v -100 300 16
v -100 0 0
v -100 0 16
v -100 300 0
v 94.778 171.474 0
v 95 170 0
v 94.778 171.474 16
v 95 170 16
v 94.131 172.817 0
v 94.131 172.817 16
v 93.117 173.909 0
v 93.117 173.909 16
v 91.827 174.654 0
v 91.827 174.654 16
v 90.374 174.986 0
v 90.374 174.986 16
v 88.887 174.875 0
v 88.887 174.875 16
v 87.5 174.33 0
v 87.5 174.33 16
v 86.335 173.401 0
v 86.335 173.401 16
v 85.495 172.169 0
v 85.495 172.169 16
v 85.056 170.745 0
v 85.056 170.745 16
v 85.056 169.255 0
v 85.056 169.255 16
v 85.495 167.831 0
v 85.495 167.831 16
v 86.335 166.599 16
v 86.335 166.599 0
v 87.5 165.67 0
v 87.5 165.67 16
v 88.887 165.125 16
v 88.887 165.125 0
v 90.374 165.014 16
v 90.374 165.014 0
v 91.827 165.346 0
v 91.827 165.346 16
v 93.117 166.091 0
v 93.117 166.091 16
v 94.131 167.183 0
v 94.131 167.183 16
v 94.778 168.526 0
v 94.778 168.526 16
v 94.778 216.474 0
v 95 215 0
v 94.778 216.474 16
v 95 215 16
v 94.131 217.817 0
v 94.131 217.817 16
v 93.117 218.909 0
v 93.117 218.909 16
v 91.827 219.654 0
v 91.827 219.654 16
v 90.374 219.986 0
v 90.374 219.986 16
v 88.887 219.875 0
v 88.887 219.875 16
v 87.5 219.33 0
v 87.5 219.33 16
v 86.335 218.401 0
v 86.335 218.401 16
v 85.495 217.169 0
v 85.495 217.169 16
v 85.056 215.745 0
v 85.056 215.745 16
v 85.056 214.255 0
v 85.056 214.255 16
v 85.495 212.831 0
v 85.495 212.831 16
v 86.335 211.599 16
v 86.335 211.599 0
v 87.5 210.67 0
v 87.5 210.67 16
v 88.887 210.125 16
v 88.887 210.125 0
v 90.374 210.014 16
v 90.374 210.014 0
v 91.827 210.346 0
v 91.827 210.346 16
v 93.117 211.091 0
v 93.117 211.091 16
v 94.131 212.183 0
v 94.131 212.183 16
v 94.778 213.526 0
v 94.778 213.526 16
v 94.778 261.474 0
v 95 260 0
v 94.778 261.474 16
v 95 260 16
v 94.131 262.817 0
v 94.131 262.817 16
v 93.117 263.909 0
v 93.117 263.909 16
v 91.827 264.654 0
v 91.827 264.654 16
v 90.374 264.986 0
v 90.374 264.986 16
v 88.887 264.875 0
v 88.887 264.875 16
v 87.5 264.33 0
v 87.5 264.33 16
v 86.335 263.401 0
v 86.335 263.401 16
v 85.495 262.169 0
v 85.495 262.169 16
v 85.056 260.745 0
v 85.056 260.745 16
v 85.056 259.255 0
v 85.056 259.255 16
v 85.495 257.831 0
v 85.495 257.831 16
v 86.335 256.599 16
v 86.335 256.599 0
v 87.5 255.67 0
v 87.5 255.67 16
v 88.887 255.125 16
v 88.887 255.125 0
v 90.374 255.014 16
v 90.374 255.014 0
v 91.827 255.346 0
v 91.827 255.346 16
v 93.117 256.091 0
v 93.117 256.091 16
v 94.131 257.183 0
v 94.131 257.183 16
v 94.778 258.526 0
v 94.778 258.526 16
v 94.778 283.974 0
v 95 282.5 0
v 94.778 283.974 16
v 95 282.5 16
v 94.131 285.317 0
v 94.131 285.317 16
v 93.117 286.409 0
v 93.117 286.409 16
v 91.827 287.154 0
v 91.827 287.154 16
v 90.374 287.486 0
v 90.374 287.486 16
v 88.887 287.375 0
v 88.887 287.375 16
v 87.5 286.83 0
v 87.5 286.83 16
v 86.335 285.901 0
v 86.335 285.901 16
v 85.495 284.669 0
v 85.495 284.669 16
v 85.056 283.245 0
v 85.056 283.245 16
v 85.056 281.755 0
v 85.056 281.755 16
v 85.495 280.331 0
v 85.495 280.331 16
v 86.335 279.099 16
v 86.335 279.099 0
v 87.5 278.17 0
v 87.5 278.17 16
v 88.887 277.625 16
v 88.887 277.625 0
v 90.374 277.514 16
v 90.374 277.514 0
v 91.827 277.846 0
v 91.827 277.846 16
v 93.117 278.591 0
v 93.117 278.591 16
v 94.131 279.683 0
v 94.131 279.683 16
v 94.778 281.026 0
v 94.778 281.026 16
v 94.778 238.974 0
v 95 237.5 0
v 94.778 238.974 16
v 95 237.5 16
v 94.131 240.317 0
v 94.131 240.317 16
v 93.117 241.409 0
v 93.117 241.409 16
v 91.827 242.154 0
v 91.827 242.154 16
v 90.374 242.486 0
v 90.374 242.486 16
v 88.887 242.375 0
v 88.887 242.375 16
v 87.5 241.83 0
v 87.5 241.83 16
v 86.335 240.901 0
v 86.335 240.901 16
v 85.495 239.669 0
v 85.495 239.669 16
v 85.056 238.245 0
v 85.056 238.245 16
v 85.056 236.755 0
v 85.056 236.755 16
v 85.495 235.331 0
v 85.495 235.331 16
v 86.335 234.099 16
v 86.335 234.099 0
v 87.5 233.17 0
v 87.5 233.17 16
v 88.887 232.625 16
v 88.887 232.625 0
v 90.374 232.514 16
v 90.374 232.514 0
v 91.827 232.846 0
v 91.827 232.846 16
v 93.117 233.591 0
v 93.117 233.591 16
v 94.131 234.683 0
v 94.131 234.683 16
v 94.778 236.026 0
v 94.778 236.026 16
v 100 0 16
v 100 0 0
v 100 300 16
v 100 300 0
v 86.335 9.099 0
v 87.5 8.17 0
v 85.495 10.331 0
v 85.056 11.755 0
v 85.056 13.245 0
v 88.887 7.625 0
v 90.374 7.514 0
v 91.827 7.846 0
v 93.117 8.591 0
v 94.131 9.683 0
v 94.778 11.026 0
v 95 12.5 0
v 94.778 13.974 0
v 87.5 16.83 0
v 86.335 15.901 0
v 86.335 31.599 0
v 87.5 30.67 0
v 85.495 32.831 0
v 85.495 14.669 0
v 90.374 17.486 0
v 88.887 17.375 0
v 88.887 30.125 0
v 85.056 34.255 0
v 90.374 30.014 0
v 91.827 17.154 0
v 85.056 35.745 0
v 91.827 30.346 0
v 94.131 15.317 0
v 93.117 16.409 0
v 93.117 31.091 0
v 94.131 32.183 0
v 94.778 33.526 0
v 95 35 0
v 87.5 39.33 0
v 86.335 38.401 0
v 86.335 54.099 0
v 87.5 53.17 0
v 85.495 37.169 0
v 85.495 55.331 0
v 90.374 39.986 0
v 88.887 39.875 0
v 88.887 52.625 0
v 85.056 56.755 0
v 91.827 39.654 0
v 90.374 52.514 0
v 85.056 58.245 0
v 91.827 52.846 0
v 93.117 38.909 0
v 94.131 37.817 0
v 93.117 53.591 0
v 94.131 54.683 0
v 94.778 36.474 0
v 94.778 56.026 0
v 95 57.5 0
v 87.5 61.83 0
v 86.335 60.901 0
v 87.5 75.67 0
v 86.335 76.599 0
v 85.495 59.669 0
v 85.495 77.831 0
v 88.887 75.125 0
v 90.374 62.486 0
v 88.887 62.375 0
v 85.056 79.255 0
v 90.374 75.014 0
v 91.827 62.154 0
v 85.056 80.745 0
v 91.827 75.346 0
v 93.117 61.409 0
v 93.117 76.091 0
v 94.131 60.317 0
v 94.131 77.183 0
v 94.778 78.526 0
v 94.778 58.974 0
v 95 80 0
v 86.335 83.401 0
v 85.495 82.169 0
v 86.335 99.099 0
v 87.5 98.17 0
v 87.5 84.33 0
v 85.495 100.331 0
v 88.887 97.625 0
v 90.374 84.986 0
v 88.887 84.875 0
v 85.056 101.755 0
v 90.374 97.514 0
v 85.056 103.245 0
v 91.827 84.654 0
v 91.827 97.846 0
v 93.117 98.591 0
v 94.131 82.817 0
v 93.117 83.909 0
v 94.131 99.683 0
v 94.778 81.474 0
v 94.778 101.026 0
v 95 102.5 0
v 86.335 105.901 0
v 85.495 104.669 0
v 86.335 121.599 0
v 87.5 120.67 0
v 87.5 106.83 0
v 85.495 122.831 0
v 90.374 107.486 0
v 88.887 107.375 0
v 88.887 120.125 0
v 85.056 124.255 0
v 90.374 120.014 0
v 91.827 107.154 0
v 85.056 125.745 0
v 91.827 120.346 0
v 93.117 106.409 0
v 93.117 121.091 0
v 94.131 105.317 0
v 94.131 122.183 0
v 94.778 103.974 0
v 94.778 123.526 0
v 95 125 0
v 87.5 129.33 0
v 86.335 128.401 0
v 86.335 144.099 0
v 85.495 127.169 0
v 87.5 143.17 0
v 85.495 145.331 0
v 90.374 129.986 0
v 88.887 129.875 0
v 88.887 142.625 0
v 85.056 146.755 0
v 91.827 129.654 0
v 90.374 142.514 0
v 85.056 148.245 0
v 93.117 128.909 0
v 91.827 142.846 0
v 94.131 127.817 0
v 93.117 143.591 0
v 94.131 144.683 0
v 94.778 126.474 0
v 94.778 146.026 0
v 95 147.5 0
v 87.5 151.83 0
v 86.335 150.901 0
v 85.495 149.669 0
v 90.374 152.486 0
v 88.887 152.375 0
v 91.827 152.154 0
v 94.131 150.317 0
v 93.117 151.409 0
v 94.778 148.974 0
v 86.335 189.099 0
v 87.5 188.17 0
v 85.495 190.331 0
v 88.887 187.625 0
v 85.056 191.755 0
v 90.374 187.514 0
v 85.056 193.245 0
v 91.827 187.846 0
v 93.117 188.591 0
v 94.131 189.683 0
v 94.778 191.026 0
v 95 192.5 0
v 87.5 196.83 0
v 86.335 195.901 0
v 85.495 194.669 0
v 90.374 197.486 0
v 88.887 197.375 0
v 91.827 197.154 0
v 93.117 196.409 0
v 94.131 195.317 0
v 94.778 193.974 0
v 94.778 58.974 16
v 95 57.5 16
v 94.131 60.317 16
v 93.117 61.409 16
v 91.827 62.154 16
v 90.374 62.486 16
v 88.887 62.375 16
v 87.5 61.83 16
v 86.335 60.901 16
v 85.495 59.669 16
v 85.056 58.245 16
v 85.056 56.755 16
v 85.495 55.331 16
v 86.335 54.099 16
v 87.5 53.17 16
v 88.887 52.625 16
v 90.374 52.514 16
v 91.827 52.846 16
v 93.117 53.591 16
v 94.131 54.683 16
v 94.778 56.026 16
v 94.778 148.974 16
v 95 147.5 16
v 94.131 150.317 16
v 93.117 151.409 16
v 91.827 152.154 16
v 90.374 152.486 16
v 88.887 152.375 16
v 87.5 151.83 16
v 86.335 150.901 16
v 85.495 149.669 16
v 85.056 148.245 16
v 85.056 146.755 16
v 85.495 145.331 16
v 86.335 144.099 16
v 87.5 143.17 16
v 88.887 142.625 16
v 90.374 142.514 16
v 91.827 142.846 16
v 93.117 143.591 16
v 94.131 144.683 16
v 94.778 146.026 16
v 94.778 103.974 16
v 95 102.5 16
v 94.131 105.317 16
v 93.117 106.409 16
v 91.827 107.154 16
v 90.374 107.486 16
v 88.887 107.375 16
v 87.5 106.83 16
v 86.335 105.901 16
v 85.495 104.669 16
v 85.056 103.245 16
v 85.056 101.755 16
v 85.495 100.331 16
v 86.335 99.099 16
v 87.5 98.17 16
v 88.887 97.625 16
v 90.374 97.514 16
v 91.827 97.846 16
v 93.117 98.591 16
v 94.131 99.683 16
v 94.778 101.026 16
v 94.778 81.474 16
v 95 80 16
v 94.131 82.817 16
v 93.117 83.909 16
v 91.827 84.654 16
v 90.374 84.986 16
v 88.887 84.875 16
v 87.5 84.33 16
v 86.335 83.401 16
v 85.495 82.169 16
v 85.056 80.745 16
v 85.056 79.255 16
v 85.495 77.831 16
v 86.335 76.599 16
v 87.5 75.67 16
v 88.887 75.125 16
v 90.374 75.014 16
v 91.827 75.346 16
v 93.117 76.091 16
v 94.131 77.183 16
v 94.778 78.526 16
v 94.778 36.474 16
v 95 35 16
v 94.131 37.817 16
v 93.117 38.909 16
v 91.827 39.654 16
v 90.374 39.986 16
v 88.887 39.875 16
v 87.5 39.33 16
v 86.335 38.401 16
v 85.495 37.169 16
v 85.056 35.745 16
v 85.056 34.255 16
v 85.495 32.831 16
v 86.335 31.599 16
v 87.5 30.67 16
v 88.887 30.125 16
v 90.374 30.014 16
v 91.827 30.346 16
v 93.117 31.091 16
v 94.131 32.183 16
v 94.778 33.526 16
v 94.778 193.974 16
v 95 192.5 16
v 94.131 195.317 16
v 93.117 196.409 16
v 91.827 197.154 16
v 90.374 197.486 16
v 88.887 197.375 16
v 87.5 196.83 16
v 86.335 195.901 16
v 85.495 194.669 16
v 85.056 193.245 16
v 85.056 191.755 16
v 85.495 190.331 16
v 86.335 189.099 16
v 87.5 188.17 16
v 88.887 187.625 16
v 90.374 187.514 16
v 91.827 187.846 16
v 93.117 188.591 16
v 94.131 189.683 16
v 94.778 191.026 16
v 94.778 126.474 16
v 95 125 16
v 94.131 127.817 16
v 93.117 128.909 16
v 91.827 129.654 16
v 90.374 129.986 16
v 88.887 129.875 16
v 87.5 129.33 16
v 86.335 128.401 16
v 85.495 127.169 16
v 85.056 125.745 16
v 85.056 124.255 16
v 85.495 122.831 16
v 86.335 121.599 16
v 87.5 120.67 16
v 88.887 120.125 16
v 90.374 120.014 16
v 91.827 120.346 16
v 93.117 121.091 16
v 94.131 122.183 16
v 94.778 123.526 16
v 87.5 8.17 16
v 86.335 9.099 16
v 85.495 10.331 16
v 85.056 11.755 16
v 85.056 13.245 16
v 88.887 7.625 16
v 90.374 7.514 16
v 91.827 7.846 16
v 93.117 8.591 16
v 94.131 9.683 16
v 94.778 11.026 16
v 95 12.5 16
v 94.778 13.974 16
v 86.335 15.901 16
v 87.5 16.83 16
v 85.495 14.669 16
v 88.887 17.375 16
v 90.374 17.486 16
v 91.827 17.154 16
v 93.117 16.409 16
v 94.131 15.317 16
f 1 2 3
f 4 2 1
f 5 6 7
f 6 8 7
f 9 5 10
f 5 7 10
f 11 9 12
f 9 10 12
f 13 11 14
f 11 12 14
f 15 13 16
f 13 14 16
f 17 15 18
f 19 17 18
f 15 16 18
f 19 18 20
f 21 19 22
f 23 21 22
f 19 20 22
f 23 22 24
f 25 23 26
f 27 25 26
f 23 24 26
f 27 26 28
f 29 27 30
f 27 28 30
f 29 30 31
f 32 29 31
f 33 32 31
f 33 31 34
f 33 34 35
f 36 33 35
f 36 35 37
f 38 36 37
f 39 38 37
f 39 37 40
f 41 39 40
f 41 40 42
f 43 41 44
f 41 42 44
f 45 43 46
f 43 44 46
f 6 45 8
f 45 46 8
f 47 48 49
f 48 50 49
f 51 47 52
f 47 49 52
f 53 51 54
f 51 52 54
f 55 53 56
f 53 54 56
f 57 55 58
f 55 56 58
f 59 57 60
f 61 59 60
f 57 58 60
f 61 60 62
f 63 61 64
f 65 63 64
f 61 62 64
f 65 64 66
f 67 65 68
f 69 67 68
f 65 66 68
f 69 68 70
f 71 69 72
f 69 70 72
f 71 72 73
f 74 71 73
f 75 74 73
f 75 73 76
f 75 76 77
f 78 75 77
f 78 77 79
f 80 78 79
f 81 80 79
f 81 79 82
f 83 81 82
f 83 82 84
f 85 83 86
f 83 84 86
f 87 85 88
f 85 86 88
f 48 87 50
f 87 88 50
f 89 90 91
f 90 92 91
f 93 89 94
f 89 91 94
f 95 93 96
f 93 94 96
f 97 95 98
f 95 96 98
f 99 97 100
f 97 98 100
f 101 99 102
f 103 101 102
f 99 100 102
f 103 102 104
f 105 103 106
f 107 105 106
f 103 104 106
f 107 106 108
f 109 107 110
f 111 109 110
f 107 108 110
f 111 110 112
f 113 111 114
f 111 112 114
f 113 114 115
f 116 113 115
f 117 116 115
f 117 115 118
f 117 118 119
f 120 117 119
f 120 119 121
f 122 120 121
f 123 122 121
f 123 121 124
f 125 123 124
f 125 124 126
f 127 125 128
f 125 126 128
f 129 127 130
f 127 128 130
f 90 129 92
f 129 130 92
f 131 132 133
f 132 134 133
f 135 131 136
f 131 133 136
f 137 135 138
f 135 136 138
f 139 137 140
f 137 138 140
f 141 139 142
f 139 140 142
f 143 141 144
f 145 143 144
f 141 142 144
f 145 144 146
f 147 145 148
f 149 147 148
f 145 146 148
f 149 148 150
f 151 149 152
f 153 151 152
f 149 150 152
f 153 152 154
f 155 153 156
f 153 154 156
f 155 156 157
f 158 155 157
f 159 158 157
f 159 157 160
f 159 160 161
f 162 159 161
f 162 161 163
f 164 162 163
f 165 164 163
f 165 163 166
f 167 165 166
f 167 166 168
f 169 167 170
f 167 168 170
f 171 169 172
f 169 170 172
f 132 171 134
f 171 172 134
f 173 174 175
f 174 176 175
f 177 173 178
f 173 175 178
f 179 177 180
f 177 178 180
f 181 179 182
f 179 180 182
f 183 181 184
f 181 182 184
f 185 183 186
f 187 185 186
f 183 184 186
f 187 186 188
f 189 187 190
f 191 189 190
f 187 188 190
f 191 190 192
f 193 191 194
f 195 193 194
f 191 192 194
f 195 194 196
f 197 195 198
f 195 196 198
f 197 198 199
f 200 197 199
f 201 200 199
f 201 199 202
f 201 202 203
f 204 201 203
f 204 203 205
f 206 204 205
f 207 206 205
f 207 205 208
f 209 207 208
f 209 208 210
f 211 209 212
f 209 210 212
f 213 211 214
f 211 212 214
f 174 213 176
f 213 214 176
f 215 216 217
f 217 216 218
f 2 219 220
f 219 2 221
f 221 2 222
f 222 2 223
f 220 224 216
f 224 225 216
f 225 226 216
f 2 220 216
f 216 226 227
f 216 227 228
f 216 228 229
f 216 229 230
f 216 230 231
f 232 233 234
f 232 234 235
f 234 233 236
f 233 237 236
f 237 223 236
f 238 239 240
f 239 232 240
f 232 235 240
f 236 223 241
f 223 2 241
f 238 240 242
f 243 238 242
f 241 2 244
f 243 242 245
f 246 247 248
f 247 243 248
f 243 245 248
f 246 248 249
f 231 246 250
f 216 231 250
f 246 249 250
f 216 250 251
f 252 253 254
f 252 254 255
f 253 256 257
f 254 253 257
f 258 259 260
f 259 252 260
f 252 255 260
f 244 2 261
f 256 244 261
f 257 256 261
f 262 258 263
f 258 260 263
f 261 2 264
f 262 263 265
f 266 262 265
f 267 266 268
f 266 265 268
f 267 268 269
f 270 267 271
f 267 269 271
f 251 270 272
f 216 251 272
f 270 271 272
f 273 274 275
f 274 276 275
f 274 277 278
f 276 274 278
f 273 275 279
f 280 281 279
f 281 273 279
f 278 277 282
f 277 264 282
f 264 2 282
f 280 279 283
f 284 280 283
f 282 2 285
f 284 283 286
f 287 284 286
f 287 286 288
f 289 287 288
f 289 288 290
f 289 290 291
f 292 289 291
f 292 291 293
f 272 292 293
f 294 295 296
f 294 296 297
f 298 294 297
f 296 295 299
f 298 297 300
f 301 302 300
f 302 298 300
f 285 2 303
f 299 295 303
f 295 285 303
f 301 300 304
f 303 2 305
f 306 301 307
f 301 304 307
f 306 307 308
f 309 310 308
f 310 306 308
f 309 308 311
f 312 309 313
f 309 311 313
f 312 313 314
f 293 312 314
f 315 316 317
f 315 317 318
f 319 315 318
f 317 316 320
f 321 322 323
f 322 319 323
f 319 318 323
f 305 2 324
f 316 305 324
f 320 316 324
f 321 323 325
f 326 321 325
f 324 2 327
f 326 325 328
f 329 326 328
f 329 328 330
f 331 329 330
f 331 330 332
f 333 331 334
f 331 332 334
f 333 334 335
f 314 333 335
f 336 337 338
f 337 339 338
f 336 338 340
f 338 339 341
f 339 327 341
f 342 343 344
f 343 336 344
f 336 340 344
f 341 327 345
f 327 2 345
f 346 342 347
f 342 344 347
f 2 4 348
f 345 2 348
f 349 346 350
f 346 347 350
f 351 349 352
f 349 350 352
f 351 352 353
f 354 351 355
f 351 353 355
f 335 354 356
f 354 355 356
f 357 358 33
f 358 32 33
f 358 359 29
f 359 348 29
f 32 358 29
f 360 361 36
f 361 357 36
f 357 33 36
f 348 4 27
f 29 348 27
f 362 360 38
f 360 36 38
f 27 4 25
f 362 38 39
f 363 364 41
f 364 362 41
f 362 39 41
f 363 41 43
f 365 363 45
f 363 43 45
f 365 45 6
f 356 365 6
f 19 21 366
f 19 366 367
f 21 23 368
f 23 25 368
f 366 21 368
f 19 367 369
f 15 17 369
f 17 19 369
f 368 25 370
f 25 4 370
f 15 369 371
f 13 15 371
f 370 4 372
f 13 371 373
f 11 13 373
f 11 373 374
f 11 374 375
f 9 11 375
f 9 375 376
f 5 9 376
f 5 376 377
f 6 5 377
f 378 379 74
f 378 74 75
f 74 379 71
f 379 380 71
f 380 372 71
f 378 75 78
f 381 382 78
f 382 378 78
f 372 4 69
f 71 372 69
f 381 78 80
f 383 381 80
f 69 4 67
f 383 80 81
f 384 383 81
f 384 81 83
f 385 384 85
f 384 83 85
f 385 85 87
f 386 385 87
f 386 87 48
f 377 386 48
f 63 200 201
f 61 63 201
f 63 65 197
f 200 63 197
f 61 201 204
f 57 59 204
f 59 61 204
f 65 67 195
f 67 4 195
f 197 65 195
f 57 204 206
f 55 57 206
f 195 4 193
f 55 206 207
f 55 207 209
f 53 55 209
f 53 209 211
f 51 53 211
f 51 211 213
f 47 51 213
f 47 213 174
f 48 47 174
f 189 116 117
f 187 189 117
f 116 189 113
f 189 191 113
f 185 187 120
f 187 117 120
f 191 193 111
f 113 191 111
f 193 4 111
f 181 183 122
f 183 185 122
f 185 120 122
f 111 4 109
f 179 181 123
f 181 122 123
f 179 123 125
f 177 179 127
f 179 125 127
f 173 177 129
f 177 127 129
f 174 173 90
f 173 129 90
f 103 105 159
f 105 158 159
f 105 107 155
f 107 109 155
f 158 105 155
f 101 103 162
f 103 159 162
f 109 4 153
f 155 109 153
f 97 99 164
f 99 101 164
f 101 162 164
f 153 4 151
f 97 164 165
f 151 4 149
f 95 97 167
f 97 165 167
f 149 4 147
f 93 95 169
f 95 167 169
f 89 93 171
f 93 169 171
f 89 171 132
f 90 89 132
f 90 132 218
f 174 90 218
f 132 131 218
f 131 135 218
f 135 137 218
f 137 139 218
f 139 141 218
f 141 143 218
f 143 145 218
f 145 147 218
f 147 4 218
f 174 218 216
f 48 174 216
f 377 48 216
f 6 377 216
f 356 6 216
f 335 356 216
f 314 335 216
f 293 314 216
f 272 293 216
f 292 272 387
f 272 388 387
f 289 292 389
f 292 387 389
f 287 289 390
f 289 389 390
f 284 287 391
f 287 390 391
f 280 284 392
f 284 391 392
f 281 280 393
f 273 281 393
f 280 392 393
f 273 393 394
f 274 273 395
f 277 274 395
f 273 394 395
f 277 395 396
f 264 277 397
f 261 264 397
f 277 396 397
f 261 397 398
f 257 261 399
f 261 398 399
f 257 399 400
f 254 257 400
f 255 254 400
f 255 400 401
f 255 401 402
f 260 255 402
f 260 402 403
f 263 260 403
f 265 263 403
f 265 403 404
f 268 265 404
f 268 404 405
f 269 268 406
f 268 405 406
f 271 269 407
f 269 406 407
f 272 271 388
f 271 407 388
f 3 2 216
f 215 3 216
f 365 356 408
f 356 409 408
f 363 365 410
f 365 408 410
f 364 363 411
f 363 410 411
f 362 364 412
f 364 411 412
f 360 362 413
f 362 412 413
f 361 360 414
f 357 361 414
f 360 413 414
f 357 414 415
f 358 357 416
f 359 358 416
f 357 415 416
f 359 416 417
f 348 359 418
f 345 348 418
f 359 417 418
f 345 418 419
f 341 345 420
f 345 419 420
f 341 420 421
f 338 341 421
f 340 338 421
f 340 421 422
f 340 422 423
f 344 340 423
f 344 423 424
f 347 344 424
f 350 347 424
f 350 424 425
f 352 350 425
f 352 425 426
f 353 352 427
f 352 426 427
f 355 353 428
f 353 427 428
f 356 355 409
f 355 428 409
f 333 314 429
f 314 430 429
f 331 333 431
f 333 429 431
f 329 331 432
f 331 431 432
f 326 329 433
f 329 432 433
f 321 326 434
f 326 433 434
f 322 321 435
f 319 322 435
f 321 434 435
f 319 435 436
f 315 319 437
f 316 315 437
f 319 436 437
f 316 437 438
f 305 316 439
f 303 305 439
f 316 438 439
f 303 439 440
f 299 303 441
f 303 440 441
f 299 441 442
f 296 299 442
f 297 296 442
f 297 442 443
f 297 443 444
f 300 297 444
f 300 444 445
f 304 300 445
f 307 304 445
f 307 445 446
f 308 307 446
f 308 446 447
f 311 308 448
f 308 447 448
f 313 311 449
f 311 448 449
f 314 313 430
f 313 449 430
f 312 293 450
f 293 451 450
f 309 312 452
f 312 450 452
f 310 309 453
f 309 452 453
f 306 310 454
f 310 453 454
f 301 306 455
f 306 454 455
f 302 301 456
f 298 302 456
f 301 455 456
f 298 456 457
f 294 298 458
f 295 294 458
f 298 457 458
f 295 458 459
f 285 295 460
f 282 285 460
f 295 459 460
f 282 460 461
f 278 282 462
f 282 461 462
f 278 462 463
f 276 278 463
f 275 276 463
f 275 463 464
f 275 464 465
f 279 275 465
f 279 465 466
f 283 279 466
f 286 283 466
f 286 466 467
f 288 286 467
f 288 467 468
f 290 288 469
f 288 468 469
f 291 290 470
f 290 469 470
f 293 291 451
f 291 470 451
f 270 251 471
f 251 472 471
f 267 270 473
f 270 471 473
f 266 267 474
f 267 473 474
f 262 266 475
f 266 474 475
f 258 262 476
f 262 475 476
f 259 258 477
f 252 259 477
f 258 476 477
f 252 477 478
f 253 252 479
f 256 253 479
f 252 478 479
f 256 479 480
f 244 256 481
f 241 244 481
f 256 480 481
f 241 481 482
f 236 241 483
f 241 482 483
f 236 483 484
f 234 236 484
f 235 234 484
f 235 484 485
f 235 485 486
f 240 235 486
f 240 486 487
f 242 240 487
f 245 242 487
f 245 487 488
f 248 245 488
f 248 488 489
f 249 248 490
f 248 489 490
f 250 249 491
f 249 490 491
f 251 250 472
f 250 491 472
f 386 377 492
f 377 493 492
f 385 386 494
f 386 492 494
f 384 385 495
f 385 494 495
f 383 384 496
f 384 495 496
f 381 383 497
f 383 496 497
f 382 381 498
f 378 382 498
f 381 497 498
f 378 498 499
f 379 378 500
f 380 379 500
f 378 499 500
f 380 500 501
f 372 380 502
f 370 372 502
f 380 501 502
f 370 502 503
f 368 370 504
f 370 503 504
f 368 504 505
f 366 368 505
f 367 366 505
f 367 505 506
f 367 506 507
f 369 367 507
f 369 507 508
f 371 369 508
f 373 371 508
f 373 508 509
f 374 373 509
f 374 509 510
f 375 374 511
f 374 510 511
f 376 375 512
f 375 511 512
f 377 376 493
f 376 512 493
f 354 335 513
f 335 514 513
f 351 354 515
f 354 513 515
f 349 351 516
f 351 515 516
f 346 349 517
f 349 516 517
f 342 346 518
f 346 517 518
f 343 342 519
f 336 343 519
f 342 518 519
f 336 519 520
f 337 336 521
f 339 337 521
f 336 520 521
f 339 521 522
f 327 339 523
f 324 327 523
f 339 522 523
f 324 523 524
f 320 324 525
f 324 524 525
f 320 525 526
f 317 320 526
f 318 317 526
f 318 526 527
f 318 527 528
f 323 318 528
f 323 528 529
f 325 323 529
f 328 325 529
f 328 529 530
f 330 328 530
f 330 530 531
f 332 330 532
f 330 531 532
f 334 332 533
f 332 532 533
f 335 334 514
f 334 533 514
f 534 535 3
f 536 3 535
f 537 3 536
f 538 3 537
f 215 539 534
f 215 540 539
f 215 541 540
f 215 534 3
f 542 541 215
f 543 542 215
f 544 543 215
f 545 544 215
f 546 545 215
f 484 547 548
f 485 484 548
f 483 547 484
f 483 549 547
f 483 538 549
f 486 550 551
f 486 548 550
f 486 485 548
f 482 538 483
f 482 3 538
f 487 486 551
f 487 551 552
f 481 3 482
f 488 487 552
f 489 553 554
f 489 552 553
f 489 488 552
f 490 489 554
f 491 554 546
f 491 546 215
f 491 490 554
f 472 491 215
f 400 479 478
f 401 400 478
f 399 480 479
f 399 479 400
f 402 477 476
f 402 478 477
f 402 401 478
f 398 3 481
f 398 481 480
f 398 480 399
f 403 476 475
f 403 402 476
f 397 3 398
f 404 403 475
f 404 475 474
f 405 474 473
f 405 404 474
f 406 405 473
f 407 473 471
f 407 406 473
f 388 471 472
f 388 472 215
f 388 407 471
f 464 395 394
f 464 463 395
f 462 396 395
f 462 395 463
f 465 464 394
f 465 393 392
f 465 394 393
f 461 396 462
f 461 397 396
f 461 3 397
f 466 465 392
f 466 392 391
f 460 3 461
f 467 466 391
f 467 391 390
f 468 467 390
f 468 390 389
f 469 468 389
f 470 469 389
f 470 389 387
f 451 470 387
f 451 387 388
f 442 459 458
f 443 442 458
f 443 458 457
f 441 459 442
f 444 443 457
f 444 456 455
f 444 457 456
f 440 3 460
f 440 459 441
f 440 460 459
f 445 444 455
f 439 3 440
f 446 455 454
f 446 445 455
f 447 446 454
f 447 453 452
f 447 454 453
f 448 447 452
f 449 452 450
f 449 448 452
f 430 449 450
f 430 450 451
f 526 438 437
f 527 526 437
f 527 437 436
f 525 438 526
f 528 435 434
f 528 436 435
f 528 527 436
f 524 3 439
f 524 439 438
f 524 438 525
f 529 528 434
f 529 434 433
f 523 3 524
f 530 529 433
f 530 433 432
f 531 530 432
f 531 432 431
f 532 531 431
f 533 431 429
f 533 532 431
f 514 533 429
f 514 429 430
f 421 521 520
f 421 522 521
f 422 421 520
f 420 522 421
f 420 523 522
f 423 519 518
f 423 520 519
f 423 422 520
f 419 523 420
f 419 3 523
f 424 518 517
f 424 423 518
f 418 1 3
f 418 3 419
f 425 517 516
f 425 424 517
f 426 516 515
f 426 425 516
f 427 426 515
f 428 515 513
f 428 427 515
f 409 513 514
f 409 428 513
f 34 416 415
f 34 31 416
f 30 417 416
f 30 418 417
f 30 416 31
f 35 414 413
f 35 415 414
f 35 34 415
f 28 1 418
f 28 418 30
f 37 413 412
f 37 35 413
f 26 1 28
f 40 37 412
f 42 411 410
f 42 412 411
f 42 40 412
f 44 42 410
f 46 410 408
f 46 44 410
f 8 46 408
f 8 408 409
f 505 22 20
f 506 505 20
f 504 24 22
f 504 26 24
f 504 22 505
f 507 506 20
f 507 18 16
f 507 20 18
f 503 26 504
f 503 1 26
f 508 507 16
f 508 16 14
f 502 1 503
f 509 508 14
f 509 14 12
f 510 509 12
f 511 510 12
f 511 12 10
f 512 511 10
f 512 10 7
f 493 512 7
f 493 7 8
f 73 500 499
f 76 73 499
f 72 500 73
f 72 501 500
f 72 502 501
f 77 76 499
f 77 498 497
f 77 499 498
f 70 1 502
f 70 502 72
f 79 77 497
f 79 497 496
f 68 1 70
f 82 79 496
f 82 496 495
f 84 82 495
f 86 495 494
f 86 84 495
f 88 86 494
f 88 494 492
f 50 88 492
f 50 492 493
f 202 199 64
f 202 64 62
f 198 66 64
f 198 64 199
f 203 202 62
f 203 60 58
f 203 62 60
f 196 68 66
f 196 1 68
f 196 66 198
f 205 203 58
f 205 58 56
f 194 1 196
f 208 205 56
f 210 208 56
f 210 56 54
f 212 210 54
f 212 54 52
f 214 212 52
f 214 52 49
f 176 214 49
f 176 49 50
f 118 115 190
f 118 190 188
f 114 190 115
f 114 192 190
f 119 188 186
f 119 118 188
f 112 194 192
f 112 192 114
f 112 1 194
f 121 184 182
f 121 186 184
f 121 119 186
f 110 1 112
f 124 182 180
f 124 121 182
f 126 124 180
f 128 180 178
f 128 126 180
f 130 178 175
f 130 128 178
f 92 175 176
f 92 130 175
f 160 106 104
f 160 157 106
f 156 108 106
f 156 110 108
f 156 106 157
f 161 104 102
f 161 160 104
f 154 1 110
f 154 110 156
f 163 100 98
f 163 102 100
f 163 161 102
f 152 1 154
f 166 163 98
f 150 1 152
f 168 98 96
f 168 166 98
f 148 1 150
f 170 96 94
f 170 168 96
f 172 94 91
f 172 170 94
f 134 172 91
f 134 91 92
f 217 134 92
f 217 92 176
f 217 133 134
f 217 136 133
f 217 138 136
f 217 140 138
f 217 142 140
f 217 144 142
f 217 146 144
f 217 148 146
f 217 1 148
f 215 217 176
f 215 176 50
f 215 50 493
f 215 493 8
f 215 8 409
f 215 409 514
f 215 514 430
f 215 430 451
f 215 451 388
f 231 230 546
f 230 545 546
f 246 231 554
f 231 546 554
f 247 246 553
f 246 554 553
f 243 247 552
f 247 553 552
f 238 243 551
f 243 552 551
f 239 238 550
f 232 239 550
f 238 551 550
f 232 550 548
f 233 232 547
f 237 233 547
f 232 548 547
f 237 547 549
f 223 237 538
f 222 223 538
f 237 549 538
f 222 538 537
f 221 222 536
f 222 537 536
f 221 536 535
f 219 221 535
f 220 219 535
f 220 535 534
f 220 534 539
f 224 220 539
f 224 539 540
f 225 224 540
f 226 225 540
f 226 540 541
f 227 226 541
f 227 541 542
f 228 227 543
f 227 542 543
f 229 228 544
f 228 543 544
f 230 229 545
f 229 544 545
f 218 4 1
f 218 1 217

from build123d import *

# Parameters (mm, degrees)
SKETCH1_W           = 200
SKETCH1_H           = 300
BOSS_EXTRUDE1_DEPTH = 16
SKETCH2_R           = 5
CUT_EXTRUDE3_DEPTH  = 317.632278835
LPATTERN1_COUNT     = 13
LPATTERN1_PITCH     = 22.5


with BuildPart() as part:
    # Sketch1 → Boss-Extrude1 (new body)
    with BuildSketch(Plane.XY):
        with Locations((0, 150)):
            Rectangle(SKETCH1_W, SKETCH1_H)
    extrude(amount=BOSS_EXTRUDE1_DEPTH)

    # Sketch2 → Cut-Extrude3 (cut, symmetric)
    with BuildSketch(Plane.XY.offset(16)):
        with Locations((90, 12.5)):
            Circle(SKETCH2_R)
    cut_extrude3 = extrude(amount=CUT_EXTRUDE3_DEPTH, both=True, mode=Mode.SUBTRACT)

    # LPattern1: Cut-Extrude3 ×13
    with Locations(*[(0, i * LPATTERN1_PITCH, 0) for i in range(1, LPATTERN1_COUNT)]):
        add(cut_extrude3, mode=Mode.SUBTRACT)


solid = part.part
